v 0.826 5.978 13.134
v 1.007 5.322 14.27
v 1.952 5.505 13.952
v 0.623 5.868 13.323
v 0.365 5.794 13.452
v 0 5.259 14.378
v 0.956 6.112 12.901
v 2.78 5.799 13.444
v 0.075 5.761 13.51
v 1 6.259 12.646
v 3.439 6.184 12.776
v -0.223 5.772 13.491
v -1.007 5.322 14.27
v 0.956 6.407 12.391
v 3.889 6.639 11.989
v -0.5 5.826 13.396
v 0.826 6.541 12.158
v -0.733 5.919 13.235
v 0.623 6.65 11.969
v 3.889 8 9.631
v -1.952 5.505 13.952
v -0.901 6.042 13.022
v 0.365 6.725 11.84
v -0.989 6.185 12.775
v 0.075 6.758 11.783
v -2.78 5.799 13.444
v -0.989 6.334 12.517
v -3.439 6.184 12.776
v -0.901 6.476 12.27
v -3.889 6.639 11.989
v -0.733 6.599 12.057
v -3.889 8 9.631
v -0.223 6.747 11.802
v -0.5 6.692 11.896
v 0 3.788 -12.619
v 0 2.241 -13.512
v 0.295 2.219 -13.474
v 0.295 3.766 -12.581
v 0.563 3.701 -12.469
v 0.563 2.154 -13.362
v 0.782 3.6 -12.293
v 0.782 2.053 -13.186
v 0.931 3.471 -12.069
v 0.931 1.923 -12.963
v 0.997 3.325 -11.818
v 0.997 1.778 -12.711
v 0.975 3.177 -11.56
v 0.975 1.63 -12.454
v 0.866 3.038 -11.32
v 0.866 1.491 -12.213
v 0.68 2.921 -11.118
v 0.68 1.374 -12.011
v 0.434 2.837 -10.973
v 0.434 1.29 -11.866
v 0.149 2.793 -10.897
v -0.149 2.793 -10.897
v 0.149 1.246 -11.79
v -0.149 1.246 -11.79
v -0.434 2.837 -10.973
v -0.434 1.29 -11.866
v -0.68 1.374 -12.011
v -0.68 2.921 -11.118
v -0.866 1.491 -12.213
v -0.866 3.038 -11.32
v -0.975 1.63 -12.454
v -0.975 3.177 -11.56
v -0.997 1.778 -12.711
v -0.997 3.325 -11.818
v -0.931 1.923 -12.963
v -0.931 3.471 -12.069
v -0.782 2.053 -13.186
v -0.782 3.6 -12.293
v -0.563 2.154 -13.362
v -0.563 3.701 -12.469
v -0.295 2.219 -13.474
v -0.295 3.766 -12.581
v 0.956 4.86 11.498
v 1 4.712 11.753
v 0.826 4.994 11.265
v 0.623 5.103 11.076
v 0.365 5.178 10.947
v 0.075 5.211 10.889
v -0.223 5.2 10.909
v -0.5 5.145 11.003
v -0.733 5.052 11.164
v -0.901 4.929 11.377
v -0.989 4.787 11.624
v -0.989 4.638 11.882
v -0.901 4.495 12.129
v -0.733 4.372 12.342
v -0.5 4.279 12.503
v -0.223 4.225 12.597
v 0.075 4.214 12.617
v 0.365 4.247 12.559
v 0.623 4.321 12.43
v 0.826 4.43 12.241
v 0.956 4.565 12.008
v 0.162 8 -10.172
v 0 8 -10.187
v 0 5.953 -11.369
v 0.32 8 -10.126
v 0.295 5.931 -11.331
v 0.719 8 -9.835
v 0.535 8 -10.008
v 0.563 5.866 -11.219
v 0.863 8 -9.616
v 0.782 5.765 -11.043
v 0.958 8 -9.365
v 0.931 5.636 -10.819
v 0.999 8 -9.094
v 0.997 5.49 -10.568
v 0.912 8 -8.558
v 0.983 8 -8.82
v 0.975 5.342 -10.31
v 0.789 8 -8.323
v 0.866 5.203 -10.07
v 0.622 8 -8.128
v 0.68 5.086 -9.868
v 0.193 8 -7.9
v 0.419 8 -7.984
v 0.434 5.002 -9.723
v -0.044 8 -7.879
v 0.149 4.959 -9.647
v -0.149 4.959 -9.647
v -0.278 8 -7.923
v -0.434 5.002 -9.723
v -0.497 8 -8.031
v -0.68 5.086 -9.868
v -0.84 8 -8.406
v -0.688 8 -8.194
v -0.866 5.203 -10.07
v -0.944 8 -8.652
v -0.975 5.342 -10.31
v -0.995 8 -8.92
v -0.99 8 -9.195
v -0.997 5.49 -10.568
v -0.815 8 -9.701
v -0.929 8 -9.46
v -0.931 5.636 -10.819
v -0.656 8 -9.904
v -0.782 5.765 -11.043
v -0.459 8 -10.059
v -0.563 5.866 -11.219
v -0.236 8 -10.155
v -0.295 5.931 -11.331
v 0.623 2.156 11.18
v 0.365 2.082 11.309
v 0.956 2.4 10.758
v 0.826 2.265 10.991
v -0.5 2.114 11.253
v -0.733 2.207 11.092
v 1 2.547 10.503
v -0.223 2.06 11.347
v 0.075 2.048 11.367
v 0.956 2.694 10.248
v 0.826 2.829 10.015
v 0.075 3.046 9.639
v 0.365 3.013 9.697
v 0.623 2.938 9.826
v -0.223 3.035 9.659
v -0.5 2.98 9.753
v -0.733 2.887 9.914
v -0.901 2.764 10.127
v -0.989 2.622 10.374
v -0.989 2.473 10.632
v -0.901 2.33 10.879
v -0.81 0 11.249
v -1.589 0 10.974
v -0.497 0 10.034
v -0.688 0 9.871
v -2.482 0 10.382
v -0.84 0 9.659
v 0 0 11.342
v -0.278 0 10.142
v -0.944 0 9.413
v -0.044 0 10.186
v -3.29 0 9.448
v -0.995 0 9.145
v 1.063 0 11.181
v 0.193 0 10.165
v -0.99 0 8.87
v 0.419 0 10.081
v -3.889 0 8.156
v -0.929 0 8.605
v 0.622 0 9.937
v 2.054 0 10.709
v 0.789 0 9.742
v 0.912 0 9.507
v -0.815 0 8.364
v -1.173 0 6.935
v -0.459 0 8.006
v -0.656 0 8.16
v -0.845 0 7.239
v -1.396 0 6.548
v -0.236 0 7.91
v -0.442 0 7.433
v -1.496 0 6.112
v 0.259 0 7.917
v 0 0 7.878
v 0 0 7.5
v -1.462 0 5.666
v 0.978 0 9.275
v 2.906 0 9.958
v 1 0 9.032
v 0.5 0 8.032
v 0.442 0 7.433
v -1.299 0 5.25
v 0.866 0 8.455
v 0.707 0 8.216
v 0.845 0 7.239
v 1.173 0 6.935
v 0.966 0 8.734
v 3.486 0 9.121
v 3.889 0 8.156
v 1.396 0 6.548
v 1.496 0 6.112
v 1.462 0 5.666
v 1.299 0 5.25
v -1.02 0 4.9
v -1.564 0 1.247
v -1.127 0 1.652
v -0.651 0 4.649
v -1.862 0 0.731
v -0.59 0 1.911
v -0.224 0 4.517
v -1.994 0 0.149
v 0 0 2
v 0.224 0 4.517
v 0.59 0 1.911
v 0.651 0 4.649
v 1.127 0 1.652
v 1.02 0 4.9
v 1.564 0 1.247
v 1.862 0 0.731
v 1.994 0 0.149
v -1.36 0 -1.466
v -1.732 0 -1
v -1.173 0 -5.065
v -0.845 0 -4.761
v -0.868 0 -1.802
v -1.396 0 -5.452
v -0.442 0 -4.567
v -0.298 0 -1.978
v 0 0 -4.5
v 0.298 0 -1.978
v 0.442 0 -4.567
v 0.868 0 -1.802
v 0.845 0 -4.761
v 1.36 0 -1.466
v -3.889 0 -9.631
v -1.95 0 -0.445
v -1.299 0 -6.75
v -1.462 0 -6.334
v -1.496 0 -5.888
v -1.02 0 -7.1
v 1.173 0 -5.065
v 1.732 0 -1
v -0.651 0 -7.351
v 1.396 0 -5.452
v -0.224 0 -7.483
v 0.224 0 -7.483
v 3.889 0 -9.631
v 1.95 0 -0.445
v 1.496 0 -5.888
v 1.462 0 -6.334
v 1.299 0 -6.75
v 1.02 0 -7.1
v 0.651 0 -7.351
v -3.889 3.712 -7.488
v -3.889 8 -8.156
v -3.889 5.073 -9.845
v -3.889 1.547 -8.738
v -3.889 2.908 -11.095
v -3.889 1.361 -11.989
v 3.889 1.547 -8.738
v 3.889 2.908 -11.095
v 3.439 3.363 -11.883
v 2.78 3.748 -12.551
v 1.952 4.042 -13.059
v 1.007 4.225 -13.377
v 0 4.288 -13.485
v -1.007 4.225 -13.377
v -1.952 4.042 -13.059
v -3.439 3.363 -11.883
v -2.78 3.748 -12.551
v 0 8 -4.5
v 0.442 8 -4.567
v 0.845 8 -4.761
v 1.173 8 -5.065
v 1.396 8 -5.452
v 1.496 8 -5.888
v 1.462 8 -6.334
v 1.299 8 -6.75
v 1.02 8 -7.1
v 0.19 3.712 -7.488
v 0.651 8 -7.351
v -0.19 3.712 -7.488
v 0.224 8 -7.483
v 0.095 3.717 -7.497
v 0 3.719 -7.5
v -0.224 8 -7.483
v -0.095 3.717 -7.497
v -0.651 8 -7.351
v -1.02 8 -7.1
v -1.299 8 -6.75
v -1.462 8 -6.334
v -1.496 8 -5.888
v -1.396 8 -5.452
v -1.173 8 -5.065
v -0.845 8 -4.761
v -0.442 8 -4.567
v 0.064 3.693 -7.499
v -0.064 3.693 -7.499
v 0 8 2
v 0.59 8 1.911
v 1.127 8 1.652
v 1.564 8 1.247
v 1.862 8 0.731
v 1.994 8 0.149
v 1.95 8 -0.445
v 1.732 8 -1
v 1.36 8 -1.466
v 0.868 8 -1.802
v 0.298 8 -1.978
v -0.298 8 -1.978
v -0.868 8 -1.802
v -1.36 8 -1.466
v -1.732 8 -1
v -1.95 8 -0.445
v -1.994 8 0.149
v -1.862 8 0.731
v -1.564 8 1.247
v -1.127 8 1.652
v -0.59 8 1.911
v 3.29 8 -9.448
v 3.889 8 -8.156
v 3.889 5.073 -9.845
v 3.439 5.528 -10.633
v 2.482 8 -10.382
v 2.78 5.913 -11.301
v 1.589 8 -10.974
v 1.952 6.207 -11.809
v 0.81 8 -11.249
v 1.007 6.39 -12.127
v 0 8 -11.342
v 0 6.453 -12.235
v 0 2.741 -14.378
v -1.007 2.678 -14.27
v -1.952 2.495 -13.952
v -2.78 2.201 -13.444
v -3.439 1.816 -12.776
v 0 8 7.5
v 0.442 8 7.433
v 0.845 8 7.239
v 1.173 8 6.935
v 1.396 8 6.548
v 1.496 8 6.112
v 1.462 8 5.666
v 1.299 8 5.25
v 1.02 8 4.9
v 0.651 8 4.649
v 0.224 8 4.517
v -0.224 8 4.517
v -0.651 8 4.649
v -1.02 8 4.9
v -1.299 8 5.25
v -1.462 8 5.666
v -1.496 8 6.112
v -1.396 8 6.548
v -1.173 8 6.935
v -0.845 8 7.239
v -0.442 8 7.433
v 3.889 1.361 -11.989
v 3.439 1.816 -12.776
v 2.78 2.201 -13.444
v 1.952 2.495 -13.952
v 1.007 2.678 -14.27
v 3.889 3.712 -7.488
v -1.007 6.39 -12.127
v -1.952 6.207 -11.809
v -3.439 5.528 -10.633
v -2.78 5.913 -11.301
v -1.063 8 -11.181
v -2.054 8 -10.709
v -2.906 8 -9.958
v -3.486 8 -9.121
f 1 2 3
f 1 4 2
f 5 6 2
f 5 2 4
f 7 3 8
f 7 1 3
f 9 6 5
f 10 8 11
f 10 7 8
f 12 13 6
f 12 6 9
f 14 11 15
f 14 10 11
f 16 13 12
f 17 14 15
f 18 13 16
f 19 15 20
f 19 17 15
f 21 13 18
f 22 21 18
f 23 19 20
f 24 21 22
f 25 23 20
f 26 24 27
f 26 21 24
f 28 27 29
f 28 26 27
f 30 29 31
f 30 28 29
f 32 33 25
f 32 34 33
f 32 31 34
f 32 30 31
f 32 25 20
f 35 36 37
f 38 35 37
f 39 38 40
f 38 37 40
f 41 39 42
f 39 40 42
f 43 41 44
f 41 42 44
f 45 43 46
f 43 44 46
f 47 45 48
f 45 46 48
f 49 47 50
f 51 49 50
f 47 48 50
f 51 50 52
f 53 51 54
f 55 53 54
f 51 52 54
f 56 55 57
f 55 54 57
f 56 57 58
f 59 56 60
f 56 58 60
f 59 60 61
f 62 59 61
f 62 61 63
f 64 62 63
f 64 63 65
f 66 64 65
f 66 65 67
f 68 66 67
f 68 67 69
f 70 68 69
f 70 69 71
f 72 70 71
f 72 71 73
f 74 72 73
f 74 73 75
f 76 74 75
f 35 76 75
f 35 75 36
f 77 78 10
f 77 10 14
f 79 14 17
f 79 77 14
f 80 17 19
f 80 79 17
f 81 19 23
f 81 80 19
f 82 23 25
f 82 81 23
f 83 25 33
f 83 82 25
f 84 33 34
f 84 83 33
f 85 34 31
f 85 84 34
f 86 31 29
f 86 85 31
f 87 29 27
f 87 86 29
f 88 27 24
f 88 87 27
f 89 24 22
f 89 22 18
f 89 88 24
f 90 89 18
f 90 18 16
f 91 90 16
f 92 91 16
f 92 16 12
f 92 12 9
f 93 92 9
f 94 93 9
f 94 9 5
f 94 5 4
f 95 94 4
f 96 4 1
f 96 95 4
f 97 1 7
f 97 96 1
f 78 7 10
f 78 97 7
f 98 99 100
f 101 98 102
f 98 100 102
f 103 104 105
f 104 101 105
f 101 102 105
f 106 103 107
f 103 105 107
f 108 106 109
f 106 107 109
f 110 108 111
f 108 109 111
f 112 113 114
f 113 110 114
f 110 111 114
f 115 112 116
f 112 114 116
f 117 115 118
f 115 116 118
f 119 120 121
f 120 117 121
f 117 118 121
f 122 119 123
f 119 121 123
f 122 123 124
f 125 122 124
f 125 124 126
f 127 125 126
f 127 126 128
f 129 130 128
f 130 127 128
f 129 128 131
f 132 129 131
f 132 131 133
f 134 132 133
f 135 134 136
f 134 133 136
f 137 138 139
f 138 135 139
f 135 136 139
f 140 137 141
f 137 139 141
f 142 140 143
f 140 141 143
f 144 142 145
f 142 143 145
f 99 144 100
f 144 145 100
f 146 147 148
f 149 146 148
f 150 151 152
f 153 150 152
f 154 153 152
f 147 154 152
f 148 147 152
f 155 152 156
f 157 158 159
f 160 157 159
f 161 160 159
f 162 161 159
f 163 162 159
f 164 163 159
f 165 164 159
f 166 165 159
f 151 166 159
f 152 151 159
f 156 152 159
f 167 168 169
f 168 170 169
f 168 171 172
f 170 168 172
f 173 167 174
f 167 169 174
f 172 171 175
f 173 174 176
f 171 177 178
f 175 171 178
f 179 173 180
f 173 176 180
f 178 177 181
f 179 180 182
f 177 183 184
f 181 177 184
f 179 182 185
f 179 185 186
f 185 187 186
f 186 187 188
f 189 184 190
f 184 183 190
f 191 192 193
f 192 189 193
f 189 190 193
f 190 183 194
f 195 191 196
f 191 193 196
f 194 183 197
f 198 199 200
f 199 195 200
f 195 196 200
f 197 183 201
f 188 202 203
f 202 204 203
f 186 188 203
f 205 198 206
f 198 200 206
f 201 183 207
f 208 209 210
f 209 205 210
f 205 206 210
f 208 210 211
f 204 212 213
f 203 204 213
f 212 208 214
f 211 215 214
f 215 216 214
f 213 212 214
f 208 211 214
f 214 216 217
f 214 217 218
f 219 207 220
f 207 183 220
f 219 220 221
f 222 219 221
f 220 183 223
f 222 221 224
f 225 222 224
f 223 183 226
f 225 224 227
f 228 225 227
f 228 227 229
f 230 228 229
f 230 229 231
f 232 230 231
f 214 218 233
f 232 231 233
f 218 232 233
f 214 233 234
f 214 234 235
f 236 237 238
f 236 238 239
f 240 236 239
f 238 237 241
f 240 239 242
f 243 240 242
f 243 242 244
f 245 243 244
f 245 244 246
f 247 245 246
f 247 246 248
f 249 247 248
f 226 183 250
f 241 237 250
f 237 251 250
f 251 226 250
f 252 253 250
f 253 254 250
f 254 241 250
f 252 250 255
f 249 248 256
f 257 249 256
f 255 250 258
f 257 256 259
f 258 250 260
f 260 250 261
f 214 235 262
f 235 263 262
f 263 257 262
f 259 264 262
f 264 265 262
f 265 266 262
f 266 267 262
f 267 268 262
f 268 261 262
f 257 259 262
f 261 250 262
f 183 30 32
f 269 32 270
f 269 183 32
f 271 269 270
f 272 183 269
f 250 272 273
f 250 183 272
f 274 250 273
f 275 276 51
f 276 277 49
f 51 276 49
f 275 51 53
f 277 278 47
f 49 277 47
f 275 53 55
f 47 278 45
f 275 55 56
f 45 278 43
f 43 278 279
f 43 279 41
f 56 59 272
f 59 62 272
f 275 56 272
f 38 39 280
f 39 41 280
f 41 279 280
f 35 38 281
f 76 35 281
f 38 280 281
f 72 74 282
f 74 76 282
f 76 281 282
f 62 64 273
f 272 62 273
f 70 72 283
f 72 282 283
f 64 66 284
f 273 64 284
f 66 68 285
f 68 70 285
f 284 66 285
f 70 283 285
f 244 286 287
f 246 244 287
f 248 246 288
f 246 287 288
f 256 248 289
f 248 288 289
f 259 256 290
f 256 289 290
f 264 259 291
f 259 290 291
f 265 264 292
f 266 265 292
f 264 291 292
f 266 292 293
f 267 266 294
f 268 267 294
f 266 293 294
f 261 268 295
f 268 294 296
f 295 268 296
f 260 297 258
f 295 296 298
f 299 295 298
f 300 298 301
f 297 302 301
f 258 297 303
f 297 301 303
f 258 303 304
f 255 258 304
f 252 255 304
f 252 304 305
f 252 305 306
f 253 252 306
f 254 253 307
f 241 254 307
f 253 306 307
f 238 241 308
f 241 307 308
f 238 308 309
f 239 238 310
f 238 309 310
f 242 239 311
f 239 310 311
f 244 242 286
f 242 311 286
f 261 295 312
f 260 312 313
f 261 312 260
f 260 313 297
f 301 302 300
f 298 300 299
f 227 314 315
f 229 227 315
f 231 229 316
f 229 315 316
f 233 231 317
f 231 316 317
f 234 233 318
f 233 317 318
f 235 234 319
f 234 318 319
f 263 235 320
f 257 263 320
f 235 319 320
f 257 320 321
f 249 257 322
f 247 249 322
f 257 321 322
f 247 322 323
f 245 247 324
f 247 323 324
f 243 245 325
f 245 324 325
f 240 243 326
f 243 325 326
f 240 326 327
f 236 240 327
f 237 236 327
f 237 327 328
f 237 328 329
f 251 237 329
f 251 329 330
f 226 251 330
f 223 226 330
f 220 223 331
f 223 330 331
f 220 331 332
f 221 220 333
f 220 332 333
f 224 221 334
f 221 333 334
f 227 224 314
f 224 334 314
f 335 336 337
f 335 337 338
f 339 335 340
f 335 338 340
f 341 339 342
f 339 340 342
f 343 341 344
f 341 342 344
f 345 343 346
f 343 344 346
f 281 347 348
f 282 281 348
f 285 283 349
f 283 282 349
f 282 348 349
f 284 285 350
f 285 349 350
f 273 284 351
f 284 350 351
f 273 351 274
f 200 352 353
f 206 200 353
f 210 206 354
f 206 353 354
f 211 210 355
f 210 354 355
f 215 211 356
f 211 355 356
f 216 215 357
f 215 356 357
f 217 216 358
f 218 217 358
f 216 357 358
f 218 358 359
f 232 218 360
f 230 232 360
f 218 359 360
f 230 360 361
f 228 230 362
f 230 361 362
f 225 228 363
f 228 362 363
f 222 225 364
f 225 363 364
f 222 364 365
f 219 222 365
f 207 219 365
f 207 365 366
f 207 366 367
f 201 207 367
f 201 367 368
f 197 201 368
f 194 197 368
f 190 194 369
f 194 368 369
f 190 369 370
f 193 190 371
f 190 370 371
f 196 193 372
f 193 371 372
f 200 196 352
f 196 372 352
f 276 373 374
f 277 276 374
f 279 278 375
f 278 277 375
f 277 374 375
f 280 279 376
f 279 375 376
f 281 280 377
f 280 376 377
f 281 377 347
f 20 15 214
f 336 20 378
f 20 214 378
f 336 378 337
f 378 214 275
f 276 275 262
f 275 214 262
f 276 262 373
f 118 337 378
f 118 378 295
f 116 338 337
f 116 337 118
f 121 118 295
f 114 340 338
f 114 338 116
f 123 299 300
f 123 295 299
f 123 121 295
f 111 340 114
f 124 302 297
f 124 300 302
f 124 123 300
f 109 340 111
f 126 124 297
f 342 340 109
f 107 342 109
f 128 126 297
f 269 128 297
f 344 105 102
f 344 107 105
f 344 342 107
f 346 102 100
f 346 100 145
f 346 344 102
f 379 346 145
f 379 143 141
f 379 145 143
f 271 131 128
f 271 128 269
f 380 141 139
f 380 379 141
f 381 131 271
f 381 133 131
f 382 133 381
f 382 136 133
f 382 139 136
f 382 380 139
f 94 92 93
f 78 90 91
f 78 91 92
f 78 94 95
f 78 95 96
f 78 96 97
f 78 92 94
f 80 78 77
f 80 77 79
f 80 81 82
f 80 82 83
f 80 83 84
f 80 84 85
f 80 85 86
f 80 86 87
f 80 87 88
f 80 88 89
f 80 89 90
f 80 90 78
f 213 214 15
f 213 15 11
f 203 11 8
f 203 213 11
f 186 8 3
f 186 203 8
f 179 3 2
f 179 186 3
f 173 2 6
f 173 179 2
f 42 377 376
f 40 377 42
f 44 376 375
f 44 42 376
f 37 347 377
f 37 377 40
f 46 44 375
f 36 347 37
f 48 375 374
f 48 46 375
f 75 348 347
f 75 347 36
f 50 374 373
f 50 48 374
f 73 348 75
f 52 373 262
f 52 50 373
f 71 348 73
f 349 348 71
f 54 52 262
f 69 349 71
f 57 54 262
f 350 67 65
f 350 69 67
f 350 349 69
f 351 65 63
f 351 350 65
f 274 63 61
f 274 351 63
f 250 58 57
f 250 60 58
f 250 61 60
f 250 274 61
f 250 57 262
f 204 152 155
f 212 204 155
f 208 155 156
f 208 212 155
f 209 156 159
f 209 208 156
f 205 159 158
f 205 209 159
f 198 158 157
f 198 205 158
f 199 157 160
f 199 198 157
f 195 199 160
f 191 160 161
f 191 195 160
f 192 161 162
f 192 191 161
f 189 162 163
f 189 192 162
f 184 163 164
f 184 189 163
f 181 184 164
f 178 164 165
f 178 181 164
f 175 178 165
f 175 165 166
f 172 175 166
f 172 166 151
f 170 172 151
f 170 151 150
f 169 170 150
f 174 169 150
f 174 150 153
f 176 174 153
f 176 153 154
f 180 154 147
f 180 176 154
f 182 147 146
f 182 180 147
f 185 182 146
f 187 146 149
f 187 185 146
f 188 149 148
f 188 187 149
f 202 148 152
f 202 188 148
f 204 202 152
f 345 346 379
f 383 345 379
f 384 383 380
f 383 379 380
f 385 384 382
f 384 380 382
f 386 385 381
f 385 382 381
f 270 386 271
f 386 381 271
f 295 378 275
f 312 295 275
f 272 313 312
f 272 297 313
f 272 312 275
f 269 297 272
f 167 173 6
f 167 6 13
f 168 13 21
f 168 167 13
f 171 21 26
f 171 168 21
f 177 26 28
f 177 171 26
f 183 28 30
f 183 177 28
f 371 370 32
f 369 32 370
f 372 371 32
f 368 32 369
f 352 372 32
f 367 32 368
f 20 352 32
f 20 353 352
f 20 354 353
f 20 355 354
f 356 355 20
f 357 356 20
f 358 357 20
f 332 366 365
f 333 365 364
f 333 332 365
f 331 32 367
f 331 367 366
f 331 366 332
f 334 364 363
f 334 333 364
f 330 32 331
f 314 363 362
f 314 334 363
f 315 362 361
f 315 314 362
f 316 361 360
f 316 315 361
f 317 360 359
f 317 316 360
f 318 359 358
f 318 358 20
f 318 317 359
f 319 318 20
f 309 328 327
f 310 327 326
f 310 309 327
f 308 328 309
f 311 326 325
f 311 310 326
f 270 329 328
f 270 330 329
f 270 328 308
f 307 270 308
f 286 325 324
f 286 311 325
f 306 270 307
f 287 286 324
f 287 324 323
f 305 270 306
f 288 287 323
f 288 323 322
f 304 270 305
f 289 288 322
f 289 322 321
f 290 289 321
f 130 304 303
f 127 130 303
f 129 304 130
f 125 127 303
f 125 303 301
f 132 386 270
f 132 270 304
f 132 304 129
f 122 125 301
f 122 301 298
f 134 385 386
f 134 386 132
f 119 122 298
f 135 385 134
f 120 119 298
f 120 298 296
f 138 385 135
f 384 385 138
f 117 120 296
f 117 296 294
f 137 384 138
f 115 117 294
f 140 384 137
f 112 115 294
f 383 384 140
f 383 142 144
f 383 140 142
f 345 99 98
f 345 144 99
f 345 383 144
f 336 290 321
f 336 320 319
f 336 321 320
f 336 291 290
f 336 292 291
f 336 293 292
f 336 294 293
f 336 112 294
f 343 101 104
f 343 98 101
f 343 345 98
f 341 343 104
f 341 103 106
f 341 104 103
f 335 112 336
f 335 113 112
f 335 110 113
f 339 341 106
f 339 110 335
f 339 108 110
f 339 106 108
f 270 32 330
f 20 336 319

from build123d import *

# Parameters (mm, degrees)
SKETCH_1_W                      = 7.778385112
SKETCH_1_H                      = 31.92137072
EXTRUDE_1_DEPTH                 = 8
SKETCH_2_R                      = 1.5
SKETCH_2_R_2                    = 2
CUT_EXTRUDE_1_DEPTH             = 8
SKETCH_3_W                      = 7.778385112
SKETCH_3_H                      = 11.681320089
CUT_EXTRUDE_2_DEPTH             = 7
CUT_EXTRUDE_3_DEPTH             = 7.778385113
CUT_EXTRUDE_6_REACH             = 24.375
CUT_EXTRUDE_7_DEPTH             = 1.25
CUT_EXTRUDE_7_DEPTH_BACK        = 1.25
CUT_EXTRUDE_8_REACH             = 24.375
SKETCH_8_R                      = 1
PATTERN_CIRCULAR_5_COUNT        = 2
CUT_EXTRUDE_9_DEPTH             = 23.991982407
CUT_EXTRUDE_9_DEPTH_BACK        = 23.991982407
PATTERN_START                   = 3.938890695
PATTERN_CIRCULAR_14_OUTLINE_R   = 1
PATTERN_CIRCULAR_14_DEPTH       = 3.518451758
PATTERN_START_2                 = 9.957342453
PATTERN_CIRCULAR_14_2_OUTLINE_R = 1
PATTERN_CIRCULAR_14_2_DEPTH     = 1.78640085


# Read off the part's stored shape, not the designer's step: 阵列(圆周)14
with BuildPart() as part:
    # 草图1 → 凸台-拉伸1 (new body)
    with BuildSketch(Plane(origin=(0, 0, 0), x_dir=(1, 0, 0), z_dir=(0, 1, 0))):
        Rectangle(SKETCH_1_W, SKETCH_1_H)
    extrude(amount=EXTRUDE_1_DEPTH)

    # 草图2 → 切除-拉伸1 (cut)
    with BuildSketch(Plane(origin=(0, 8, 0), x_dir=(1, 0, 0), z_dir=(0, 1, 0))):
        with Locations(Location((0, 6, 0), (0, 0, 270))):
            Circle(SKETCH_2_R)
        with Locations(Location((0, -6, 0), (0, 0, 270))):
            Circle(SKETCH_2_R)
        with Locations(Location((0, 0, 0), (0, 0, 270))):
            Circle(SKETCH_2_R_2)
    extrude(amount=-CUT_EXTRUDE_1_DEPTH, mode=Mode.SUBTRACT)

    # 草图3 → 切除-拉伸2 (cut)
    with BuildSketch(Plane(origin=(0, 6.911179492, -11.97051402), x_dir=(-1, 0, 0), z_dir=(0, -0.499999999999998, 0.8660254037844398))):
        with Locations((0, 2.139682636)):
            Rectangle(SKETCH_3_W, SKETCH_3_H)
    cut_extrude_2 = extrude(amount=-CUT_EXTRUDE_2_DEPTH, mode=Mode.SUBTRACT)

    # 草图4 → 切除-拉伸3 (cut)
    with BuildSketch(Plane.ZY.offset(3.889192556)):
        Polygon((-14.378284056, 2.740799456), (-9.631080146, 0), (-15.96068536, 0), align=None)
    cut_extrude_3 = extrude(amount=-CUT_EXTRUDE_3_DEPTH, mode=Mode.SUBTRACT)

    # 切除-拉伸6: up to this plane
    cut_extrude_6_end = Plane(origin=(0, 8, 0), z_dir=(0, 1, 0))
    # 草图6 → 切除-拉伸6 (cut, up to the surface)
    with BuildSketch(Plane(origin=(0, -4.170380036, -2.407770036), x_dir=(1, 0, 0), z_dir=(0, -0.8660254037844396, -0.4999999999999982)), mode=Mode.PRIVATE) as cut_extrude_6_sk1:
        with BuildLine():
            Line((-3.889192556, -13.822358983), (5e-09, -13.822358983))
            ThreePointArc((5e-09, -13.822358983), (-2.384323859, -13.062439969), (-3.889192556, -11.062978192))
            Line((-3.889192556, -11.062978192), (-3.889192556, -13.822358983))
        make_face()
    cut_extrude_6_tool1 = split(extrude(cut_extrude_6_sk1.sketch, amount=-CUT_EXTRUDE_6_REACH, mode=Mode.PRIVATE), bisect_by=cut_extrude_6_end, keep=Keep.BOTH, mode=Mode.PRIVATE)
    add(cut_extrude_6_tool1.solids().sort_by_distance((-2.992661, 2.37004, -13.736111))[0], mode=Mode.SUBTRACT)
    # 草图6 → 切除-拉伸6 (cut, up to the surface)
    with BuildSketch(Plane(origin=(0, -4.170380036, -2.407770036), x_dir=(1, 0, 0), z_dir=(0, -0.8660254037844396, -0.4999999999999982)), mode=Mode.PRIVATE) as cut_extrude_6_sk2:
        with BuildLine():
            Line((3.889192556, -13.822358983), (3.889192556, -11.062978192))
            ThreePointArc((3.889192556, -11.062978192), (2.384323863, -13.062439966), (5e-09, -13.822358983))
            Line((5e-09, -13.822358983), (3.889192556, -13.822358983))
        make_face()
    cut_extrude_6_tool2 = split(extrude(cut_extrude_6_sk2.sketch, amount=-CUT_EXTRUDE_6_REACH, mode=Mode.PRIVATE), bisect_by=cut_extrude_6_end, keep=Keep.BOTH, mode=Mode.PRIVATE)
    add(cut_extrude_6_tool2.solids().sort_by_distance((2.992661, 2.37004, -13.736111))[0], mode=Mode.SUBTRACT)

    # 草图7 → 切除-拉伸7 (cut, two sides: drawn at the far end of the back side and taken through both)
    with BuildSketch(Plane(origin=(0, -1.540779764, -0.889569611), x_dir=(-1, 0, 0), z_dir=(0, -0.8660254037844396, -0.4999999999999983)).offset(-CUT_EXTRUDE_7_DEPTH_BACK)):
        with BuildLine():
            Line((-3.889192556, 11.062978192), (-3.889192556, 8.340760072))
            Line((-3.889192556, 8.340760072), (3.889192556, 8.340760072))
            Line((3.889192556, 8.340760072), (3.889192556, 11.062978192))
            ThreePointArc((3.889192556, 11.062978192), (0, 13.822358983), (-3.889192556, 11.062978192))
        make_face()
    extrude(amount=CUT_EXTRUDE_7_DEPTH + CUT_EXTRUDE_7_DEPTH_BACK, mode=Mode.SUBTRACT)

    # 切除-拉伸8: up to this plane
    cut_extrude_8_end = Plane(origin=(0, 8, 0), z_dir=(0, 1, 0))
    # 草图8 → 切除-拉伸8 (cut, up to the surface)
    with BuildSketch(Plane(origin=(0, -4.170380036, -2.407770036), x_dir=(1, 0, 0), z_dir=(0, -0.8660254037844396, -0.4999999999999982)), mode=Mode.PRIVATE) as cut_extrude_8_sk1:
        with Locations(Location((0, -11.822358983, 0), (0, 0, 270))):
            Circle(SKETCH_8_R)
    cut_extrude_8_tool1 = split(extrude(cut_extrude_8_sk1.sketch, amount=-CUT_EXTRUDE_8_REACH, mode=Mode.PRIVATE), bisect_by=cut_extrude_8_end, keep=Keep.BOTH, mode=Mode.PRIVATE)
    add(cut_extrude_8_tool1.solids().sort_by_distance((0, 1.740799, -12.646233))[0], mode=Mode.SUBTRACT)

    # 阵列(圆周)5: 切除-拉伸2, 切除-拉伸3 ×2 about axis
    pattern_circular_5_axis = Axis((-4.278111812, 4, 0), (1, 0, 0))
    add([cut_extrude_2.rotate(pattern_circular_5_axis, i * 360 / PATTERN_CIRCULAR_5_COUNT) for i in range(1, PATTERN_CIRCULAR_5_COUNT)], mode=Mode.SUBTRACT)
    add([cut_extrude_3.rotate(pattern_circular_5_axis, i * 360 / PATTERN_CIRCULAR_5_COUNT) for i in range(1, PATTERN_CIRCULAR_5_COUNT)], mode=Mode.SUBTRACT)

    # 草图10 → 切除-拉伸9 (cut, two sides: drawn at the far end of the back side and taken through both)
    with BuildSketch(Plane(origin=(0, 10.170380036, 5.871871652), x_dir=(1, 0, 0), z_dir=(0, 0.8660254037844388, 0.49999999999999994)).offset(-CUT_EXTRUDE_9_DEPTH_BACK)):
        with BuildLine():
            ThreePointArc((0, -9.822358983), (-2.384323861, -9.062439968), (-3.889192556, -7.062978192))
            Line((-3.889192556, -7.062978192), (-3.889192556, -9.822358983))
            Line((-3.889192556, -9.822358983), (0, -9.822358983))
        make_face()
        with BuildLine():
            ThreePointArc((3.889192556, -7.062978192), (2.384323861, -9.062439968), (0, -9.822358983))
            Line((0, -9.822358983), (3.889192556, -9.822358983))
            Line((3.889192556, -9.822358983), (3.889192556, -7.062978192))
        make_face()
    extrude(amount=CUT_EXTRUDE_9_DEPTH + CUT_EXTRUDE_9_DEPTH_BACK, mode=Mode.SUBTRACT)

    # 阵列(圆周)14 outline → 阵列(圆周)14 (cut)
    with BuildSketch(Plane(origin=(0, 0, 0), x_dir=(1, 0, 0), z_dir=(0, 0.8660254037844399, 0.49999999999999795)).offset(PATTERN_START)):
        with Locations((0, -7.822358983)):
            Circle(PATTERN_CIRCULAR_14_OUTLINE_R)
    extrude(amount=PATTERN_CIRCULAR_14_DEPTH, mode=Mode.SUBTRACT)

    # Pattern Circular 14 2 outline → Pattern Circular 14 2 (cut)
    with BuildSketch(Plane(origin=(0, 0, 0), x_dir=(1, 0, 0), z_dir=(0, 0.8660254037844399, 0.49999999999999795)).offset(PATTERN_START_2)):
        with Locations((0, -7.822358983)):
            Circle(PATTERN_CIRCULAR_14_2_OUTLINE_R)
    extrude(amount=PATTERN_CIRCULAR_14_2_DEPTH, mode=Mode.SUBTRACT)


solid = part.part
